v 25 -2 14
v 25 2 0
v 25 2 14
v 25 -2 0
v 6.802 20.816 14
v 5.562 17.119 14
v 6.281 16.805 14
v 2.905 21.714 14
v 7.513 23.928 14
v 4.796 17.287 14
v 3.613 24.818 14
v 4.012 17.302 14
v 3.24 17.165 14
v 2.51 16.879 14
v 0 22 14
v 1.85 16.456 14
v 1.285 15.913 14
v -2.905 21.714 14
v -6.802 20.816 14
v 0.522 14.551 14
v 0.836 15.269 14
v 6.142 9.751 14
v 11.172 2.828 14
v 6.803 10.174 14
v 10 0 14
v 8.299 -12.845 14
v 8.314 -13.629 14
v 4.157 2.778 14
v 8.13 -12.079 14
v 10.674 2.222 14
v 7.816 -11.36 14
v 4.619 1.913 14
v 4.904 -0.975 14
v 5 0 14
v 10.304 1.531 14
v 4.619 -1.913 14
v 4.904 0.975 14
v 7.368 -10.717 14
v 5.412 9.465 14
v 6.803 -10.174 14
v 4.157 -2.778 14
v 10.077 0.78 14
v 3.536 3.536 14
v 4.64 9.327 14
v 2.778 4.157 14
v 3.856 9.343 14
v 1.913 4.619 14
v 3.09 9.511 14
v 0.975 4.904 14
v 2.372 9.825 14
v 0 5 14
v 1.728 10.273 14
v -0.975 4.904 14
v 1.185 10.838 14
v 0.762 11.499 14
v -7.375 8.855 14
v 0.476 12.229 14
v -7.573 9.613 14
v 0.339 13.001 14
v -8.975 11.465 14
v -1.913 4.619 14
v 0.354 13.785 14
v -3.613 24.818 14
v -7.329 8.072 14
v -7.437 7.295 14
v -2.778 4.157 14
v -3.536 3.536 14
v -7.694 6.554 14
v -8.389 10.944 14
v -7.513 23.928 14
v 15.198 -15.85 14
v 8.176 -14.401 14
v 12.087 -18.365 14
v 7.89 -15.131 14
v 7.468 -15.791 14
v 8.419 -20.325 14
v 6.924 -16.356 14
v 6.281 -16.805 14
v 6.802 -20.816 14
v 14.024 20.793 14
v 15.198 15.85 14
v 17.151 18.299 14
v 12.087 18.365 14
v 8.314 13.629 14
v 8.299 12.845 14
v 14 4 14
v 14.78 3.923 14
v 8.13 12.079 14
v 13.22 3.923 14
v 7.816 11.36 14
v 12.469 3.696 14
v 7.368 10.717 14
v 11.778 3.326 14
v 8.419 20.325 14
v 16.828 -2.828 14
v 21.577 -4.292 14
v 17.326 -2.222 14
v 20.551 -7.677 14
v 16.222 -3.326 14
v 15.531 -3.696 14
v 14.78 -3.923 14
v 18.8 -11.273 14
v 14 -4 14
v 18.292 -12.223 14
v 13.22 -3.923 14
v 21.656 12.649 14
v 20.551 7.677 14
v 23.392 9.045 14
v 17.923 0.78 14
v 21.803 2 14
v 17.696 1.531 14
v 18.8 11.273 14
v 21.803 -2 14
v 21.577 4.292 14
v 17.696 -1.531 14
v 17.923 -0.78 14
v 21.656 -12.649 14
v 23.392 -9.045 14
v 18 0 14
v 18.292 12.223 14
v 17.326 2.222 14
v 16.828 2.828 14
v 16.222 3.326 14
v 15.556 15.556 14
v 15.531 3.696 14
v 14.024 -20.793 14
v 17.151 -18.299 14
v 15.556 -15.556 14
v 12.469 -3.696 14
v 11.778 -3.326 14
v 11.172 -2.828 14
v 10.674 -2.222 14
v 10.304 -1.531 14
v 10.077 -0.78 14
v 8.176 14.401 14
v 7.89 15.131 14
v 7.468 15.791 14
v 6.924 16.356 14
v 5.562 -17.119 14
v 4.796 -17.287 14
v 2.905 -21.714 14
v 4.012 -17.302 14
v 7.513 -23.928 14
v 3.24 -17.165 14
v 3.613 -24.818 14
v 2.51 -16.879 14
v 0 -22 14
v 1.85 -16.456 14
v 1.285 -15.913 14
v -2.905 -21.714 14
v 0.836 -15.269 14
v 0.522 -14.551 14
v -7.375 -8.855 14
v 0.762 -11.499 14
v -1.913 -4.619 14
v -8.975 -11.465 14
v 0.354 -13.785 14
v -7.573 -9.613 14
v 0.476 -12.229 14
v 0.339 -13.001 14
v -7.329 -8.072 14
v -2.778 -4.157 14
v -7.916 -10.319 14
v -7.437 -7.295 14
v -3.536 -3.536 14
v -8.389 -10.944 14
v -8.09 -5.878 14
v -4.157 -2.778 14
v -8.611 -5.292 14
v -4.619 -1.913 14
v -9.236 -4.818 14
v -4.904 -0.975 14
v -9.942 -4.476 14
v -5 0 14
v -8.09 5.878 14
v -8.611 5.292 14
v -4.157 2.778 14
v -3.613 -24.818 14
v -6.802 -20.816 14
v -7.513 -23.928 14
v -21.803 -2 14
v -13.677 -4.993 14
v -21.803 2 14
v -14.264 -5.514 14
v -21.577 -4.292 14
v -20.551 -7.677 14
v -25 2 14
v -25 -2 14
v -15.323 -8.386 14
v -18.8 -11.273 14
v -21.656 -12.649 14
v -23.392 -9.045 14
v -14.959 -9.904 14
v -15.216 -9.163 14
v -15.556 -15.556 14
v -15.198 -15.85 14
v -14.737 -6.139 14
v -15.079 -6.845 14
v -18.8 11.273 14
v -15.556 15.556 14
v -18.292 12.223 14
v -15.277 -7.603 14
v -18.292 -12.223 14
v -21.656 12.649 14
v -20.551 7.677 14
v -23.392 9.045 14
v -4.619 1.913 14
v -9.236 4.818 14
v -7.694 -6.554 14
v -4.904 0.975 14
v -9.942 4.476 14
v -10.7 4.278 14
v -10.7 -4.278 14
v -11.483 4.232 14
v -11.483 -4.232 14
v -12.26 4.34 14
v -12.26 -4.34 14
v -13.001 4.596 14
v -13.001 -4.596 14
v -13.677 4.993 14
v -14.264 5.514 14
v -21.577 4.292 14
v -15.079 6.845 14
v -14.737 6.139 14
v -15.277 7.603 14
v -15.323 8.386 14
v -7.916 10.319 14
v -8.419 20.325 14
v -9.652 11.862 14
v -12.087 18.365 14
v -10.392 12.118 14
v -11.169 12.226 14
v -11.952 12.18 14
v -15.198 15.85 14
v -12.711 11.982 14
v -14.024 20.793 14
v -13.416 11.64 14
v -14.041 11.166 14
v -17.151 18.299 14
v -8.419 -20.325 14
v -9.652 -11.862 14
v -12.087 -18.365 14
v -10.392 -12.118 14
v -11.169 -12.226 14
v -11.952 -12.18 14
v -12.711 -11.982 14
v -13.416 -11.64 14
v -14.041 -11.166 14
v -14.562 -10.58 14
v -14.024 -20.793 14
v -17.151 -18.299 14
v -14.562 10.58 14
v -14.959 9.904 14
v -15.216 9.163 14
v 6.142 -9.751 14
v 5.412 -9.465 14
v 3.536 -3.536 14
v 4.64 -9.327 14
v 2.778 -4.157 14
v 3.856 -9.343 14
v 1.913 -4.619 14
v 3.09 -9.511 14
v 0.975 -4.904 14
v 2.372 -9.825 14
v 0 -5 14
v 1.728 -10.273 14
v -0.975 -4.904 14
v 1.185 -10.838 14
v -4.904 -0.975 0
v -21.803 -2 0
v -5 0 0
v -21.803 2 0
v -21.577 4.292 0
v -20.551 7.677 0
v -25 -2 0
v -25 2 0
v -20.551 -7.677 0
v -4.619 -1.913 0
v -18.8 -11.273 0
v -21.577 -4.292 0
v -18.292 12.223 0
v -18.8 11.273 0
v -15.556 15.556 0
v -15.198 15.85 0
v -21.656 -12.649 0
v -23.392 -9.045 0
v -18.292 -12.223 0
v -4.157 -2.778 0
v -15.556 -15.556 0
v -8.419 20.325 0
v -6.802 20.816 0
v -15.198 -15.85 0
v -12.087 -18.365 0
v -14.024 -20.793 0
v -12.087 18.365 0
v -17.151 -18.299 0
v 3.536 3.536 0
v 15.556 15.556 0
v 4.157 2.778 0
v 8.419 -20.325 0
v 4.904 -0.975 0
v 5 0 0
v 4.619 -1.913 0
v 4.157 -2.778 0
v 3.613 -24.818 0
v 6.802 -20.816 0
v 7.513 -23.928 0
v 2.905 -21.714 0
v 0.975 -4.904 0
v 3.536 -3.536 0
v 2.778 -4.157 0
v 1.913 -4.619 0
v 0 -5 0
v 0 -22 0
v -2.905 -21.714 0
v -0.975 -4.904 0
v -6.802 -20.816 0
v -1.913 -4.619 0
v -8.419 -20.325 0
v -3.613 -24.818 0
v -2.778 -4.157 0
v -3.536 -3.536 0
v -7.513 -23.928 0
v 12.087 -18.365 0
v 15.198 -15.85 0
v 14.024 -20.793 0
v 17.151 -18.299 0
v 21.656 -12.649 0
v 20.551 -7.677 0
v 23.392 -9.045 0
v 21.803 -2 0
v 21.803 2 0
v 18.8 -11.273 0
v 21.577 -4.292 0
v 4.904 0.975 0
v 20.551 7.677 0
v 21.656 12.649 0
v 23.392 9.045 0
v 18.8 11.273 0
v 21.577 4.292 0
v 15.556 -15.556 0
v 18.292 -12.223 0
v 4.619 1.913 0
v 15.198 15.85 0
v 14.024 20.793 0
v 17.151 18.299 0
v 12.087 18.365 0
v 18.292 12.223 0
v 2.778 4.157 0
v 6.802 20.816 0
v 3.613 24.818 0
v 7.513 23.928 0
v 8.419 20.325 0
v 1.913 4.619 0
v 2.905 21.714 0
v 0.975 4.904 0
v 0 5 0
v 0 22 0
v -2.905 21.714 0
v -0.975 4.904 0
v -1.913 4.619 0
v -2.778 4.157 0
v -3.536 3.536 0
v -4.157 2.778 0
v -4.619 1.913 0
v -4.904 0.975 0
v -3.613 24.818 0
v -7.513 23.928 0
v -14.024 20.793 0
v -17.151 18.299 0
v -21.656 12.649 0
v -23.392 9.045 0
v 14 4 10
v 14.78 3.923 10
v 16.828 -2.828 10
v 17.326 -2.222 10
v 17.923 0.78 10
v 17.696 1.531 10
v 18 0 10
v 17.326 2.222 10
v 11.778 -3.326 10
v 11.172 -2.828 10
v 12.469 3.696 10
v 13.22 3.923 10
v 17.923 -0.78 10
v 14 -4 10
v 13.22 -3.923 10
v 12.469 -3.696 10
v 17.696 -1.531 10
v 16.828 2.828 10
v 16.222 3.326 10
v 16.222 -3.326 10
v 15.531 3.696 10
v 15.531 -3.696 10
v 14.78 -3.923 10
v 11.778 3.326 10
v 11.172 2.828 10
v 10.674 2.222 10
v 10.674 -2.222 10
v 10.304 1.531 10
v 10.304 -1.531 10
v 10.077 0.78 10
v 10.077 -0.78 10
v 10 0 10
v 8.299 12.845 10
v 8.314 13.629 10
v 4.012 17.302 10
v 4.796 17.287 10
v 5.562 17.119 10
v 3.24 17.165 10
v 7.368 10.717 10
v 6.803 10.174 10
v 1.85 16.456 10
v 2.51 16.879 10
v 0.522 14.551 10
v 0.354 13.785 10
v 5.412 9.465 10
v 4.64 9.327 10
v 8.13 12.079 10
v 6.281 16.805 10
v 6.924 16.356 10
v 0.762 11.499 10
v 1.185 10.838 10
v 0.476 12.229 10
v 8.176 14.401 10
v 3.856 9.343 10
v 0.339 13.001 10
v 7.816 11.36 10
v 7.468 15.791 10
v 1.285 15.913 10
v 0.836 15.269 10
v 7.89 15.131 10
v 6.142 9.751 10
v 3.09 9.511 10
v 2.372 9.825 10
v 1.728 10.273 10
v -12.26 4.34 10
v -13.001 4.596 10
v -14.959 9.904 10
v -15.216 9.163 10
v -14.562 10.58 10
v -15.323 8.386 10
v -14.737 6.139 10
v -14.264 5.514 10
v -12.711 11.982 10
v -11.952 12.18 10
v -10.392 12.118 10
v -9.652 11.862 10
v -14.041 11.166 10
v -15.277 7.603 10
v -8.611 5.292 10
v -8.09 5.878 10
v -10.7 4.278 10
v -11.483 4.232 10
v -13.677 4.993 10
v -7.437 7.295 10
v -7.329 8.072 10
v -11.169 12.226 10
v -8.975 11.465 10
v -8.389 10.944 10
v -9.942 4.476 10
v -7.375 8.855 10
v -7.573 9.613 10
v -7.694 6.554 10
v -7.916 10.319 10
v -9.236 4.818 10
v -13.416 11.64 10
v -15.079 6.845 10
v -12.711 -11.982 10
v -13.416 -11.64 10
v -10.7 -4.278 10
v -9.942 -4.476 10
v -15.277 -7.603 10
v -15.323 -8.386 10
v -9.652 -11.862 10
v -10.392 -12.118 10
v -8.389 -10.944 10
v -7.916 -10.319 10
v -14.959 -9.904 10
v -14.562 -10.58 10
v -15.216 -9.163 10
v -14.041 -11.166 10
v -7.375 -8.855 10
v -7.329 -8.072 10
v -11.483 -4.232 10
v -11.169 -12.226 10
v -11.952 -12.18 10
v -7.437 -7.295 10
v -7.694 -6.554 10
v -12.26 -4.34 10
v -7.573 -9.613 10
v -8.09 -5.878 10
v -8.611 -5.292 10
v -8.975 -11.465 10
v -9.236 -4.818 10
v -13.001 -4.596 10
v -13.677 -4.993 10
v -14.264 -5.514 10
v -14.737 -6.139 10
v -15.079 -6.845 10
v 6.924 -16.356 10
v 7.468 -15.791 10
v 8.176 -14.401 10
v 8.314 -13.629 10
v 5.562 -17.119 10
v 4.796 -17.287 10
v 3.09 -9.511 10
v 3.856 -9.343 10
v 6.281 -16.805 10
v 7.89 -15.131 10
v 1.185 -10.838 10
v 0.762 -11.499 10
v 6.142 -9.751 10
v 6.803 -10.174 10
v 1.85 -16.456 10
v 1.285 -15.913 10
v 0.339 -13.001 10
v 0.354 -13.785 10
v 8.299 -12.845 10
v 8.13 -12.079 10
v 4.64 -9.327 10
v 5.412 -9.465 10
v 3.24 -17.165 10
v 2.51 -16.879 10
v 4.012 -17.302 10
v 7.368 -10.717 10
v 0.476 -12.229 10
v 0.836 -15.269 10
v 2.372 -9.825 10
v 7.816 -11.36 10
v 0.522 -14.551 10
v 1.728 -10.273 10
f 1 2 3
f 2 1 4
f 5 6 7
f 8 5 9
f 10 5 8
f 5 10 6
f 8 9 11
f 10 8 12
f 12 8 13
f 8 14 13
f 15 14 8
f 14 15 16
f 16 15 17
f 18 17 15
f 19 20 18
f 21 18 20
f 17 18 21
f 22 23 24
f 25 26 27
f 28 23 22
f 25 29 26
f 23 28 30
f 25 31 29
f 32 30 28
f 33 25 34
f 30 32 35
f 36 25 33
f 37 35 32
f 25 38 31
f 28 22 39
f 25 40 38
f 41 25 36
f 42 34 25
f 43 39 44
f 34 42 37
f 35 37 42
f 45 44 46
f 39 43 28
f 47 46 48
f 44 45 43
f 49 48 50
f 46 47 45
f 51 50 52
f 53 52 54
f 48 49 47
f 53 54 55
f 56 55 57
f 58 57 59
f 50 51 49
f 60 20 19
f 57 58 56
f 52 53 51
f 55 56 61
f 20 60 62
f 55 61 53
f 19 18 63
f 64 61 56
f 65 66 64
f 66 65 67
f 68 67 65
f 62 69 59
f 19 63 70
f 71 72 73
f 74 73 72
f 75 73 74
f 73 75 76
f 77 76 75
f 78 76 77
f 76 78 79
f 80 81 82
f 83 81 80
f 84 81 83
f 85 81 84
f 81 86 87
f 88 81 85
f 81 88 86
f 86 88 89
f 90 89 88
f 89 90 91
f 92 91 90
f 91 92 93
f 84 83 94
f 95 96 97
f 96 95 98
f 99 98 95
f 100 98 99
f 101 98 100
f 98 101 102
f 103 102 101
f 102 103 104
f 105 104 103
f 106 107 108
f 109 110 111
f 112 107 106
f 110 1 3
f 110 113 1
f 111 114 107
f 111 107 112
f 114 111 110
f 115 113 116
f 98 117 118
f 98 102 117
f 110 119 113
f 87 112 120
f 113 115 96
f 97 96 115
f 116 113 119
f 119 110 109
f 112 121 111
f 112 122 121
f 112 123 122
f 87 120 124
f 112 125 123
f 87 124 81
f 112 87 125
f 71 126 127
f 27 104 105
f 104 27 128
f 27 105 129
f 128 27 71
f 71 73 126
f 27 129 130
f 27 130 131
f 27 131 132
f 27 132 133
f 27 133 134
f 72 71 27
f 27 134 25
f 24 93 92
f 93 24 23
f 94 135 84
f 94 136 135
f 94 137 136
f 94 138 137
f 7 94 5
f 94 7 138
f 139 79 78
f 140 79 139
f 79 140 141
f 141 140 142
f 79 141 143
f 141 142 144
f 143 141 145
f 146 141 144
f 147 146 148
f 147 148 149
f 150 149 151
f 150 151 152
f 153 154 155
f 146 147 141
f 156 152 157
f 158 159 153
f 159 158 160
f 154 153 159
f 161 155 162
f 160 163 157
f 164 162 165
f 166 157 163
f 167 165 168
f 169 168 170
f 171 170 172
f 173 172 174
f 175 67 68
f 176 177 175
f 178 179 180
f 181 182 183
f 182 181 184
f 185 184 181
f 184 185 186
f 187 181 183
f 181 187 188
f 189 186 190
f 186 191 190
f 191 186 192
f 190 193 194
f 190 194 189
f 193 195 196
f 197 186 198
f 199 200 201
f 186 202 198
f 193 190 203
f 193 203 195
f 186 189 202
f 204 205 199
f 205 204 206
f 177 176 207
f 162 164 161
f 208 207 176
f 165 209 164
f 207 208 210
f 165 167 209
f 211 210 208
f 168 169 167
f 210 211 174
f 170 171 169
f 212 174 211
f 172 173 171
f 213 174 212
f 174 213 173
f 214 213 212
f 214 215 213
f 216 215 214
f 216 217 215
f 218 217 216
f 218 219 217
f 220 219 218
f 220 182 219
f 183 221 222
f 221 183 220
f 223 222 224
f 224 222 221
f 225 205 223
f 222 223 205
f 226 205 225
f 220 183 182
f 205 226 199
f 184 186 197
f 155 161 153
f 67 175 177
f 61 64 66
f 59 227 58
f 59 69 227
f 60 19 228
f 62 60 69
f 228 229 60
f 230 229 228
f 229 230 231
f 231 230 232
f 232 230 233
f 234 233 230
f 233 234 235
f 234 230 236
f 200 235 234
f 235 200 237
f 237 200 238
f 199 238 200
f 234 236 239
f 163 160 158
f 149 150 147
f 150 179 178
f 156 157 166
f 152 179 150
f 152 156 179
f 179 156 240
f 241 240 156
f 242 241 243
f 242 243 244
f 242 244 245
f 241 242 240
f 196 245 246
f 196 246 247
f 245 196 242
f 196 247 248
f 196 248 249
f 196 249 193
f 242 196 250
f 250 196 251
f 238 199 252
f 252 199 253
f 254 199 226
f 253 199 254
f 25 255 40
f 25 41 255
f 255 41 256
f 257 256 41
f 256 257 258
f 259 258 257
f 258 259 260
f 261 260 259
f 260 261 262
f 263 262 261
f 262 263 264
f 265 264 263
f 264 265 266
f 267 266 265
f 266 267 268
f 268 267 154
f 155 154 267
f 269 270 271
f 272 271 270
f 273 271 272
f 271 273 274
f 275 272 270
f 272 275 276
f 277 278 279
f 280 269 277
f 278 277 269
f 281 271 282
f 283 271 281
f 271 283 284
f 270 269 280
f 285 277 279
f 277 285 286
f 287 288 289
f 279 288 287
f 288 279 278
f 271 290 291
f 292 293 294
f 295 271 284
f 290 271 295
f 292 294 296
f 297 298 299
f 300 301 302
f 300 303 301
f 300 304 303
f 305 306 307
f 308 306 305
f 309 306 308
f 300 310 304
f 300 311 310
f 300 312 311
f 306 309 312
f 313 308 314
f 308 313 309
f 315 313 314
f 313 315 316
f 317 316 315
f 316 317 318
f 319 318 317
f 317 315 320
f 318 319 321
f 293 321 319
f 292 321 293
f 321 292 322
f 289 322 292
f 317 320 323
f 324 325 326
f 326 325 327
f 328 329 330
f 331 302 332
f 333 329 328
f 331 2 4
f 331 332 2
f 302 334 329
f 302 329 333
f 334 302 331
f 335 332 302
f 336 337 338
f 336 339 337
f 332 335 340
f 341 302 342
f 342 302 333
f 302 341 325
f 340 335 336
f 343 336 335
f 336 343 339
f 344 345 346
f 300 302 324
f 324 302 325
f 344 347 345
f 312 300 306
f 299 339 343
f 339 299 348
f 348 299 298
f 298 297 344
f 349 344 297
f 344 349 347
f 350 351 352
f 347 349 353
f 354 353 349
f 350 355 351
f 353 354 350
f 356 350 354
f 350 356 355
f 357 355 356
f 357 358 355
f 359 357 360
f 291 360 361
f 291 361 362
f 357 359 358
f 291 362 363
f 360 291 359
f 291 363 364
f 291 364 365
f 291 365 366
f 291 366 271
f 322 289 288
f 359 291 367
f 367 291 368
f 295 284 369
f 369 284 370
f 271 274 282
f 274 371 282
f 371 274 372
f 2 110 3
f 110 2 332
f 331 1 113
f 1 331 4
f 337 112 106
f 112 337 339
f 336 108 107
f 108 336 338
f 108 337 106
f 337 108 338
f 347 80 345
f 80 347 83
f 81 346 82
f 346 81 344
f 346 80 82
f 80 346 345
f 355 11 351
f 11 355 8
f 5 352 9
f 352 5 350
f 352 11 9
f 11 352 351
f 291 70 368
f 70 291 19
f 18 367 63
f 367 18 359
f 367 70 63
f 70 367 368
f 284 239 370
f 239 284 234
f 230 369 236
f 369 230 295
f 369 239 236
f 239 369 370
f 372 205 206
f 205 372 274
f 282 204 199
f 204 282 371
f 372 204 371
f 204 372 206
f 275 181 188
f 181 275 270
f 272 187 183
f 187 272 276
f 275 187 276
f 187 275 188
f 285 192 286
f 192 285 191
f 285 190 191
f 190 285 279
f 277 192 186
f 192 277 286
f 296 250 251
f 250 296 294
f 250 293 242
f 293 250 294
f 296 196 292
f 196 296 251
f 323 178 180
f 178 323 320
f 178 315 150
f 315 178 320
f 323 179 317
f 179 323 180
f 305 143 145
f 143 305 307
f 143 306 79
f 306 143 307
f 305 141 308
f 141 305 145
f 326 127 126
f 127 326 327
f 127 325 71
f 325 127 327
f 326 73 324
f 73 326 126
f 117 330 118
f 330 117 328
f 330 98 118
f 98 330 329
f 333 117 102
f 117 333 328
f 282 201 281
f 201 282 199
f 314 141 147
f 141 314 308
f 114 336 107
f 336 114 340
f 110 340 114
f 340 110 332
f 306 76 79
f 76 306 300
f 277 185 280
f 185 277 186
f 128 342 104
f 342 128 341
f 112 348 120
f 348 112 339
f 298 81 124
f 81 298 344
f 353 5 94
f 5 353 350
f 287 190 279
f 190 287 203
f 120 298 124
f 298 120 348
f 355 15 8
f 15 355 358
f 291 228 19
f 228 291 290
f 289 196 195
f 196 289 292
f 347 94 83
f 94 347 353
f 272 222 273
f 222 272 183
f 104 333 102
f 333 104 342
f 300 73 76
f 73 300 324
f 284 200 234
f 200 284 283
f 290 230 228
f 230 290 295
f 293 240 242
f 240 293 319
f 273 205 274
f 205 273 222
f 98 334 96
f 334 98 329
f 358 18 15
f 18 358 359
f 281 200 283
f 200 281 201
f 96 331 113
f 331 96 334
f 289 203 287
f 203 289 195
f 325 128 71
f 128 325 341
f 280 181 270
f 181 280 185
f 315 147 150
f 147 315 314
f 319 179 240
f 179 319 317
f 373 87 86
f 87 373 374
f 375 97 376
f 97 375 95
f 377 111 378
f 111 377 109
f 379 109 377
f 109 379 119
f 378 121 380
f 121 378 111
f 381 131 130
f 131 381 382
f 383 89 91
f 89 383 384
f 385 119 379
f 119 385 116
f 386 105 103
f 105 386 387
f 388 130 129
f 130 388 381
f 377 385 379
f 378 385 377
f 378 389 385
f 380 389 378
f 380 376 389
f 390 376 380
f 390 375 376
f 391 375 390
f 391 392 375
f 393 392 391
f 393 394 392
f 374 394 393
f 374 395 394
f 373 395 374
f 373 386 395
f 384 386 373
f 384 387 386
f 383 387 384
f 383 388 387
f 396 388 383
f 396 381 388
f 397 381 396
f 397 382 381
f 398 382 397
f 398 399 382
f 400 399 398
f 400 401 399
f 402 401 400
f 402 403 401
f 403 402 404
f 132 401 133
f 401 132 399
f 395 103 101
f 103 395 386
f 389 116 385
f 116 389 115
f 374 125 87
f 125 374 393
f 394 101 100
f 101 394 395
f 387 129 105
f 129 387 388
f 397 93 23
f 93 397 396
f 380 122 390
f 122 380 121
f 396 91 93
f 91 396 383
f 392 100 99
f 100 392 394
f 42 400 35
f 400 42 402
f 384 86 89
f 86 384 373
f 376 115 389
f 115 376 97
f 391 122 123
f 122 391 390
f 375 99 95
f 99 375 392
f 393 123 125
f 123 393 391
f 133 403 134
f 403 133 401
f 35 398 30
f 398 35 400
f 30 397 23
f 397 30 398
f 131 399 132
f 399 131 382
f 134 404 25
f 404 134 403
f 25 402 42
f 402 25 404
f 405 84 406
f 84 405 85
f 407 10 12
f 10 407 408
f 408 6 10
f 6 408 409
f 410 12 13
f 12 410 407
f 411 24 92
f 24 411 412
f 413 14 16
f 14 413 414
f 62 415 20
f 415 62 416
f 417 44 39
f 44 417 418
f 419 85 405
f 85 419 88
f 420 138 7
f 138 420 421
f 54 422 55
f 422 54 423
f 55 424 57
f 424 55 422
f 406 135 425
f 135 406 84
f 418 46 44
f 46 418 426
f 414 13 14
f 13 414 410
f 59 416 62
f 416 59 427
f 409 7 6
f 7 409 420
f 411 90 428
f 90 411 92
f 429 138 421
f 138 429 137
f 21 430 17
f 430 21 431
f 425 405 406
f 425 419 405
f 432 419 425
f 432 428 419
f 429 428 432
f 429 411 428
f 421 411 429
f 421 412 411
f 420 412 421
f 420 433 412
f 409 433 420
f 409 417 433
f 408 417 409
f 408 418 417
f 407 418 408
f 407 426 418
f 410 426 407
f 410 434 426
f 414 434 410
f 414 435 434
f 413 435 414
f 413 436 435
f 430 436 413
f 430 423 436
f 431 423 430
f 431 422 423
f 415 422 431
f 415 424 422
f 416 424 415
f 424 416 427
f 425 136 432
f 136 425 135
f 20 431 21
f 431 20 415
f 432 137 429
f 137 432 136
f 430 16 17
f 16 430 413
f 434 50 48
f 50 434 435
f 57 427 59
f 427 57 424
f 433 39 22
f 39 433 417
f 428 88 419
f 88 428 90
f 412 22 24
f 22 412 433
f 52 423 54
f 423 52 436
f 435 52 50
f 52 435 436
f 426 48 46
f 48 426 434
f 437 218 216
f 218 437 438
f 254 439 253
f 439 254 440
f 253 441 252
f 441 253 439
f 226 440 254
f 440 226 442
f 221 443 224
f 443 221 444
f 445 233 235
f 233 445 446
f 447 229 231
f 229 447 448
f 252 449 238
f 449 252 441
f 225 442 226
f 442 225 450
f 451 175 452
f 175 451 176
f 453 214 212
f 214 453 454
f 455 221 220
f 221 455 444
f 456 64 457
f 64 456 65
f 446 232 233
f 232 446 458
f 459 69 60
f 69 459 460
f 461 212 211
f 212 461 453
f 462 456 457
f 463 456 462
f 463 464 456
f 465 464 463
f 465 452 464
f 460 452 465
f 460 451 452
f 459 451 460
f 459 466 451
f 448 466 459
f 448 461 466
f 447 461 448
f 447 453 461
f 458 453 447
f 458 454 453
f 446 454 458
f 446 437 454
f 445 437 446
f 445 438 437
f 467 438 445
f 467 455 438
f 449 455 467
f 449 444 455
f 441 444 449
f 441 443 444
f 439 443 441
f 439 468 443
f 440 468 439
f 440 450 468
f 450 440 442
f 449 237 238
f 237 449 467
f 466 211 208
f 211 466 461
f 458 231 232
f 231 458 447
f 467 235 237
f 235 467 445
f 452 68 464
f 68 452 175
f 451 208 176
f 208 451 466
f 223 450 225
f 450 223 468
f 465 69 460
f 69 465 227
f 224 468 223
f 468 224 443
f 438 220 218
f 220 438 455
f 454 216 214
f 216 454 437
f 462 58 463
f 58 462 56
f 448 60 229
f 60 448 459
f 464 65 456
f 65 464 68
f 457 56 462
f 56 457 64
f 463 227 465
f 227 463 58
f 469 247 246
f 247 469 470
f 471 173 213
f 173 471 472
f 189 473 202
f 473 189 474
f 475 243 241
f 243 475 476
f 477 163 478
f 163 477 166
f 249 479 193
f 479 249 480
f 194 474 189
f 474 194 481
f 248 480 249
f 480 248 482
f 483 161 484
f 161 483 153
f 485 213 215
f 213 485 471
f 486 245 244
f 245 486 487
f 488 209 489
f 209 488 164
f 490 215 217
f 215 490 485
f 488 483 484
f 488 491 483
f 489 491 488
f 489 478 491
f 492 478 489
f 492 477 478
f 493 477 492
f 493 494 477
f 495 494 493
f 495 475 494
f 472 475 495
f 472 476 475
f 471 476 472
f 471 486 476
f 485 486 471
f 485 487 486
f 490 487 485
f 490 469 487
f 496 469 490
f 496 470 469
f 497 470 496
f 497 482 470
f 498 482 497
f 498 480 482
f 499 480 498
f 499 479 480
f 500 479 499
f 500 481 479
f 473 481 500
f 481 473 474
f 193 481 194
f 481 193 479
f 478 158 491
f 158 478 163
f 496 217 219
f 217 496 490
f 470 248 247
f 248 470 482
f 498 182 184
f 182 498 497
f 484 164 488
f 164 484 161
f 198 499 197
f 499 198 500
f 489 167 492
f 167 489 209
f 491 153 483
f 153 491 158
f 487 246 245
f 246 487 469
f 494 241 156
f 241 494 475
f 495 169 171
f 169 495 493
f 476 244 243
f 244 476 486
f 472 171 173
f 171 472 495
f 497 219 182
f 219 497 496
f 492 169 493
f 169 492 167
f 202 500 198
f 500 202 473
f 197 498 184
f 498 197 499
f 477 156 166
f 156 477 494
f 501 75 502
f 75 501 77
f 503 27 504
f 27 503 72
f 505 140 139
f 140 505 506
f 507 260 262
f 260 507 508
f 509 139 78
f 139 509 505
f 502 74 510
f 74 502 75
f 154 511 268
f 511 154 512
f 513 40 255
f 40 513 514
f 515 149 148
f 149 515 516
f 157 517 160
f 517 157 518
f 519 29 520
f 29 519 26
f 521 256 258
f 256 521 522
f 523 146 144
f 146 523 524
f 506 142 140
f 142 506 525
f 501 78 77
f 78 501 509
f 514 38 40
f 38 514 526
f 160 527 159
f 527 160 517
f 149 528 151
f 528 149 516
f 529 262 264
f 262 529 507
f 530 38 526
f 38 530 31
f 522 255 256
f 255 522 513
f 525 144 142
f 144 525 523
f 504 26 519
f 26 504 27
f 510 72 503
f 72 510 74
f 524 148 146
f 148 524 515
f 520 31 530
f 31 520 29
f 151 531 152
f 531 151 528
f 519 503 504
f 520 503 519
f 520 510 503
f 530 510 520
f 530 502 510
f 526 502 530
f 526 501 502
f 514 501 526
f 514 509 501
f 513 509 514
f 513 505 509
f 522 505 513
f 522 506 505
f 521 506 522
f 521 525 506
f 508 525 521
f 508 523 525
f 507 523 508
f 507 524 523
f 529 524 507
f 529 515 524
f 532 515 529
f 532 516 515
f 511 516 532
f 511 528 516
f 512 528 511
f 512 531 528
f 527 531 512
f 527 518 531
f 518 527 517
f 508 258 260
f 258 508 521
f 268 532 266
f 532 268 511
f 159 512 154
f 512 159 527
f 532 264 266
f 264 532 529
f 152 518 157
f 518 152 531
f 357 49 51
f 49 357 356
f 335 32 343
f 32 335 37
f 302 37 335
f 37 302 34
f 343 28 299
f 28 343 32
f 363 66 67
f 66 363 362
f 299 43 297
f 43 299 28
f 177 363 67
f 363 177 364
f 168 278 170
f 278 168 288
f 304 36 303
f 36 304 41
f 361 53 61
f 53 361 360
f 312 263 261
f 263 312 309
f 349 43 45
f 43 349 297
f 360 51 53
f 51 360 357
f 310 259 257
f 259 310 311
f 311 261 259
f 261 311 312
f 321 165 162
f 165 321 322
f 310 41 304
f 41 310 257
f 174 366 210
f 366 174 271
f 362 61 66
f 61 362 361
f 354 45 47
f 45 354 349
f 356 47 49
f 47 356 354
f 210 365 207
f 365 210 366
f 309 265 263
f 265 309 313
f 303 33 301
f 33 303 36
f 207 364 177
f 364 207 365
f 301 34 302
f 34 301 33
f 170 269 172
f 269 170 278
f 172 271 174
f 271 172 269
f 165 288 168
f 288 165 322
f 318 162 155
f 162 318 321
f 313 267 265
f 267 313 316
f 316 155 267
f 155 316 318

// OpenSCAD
$fn = 32;

// ----------------------------------------------------------------------
// Spur blank: lightened gear blank
// ----------------------------------------------------------------------

// --- parameters (mm) ---
disc_r = 22;              // blank root radius
disc_t = 14;              // blank thickness
n_teeth = 14;             // stub tooth count
tooth_w = 4;              // tooth width at the root
tooth_h = 3;              // tooth height above the root
bore_r = 5;               // central bore radius
ring_r = 14;              // lightening pocket ring radius
pocket_r = 4;             // lightening pocket radius

out_r = disc_r + tooth_h;  // tip radius
bbox_x = 50.0;  // measured width over the teeth
bbox_y = 49.64;  // measured depth over the teeth

difference() {
union() {
  cylinder(r = disc_r, h = disc_t);
  for (i = [0 : n_teeth - 1])
    rotate([0, 0, i * 360 / n_teeth])
      translate([disc_r - 1, -tooth_w / 2, 0])
        cube([tooth_h + 1, tooth_w, disc_t]);
}
  translate([0, 0, -1]) cylinder(r = bore_r, h = disc_t + 2);
  for (i = [0 : 5])
    rotate([0, 0, i * 72])
      translate([ring_r, 0, disc_t - 4])
        cylinder(r = pocket_r, h = 5);
}
